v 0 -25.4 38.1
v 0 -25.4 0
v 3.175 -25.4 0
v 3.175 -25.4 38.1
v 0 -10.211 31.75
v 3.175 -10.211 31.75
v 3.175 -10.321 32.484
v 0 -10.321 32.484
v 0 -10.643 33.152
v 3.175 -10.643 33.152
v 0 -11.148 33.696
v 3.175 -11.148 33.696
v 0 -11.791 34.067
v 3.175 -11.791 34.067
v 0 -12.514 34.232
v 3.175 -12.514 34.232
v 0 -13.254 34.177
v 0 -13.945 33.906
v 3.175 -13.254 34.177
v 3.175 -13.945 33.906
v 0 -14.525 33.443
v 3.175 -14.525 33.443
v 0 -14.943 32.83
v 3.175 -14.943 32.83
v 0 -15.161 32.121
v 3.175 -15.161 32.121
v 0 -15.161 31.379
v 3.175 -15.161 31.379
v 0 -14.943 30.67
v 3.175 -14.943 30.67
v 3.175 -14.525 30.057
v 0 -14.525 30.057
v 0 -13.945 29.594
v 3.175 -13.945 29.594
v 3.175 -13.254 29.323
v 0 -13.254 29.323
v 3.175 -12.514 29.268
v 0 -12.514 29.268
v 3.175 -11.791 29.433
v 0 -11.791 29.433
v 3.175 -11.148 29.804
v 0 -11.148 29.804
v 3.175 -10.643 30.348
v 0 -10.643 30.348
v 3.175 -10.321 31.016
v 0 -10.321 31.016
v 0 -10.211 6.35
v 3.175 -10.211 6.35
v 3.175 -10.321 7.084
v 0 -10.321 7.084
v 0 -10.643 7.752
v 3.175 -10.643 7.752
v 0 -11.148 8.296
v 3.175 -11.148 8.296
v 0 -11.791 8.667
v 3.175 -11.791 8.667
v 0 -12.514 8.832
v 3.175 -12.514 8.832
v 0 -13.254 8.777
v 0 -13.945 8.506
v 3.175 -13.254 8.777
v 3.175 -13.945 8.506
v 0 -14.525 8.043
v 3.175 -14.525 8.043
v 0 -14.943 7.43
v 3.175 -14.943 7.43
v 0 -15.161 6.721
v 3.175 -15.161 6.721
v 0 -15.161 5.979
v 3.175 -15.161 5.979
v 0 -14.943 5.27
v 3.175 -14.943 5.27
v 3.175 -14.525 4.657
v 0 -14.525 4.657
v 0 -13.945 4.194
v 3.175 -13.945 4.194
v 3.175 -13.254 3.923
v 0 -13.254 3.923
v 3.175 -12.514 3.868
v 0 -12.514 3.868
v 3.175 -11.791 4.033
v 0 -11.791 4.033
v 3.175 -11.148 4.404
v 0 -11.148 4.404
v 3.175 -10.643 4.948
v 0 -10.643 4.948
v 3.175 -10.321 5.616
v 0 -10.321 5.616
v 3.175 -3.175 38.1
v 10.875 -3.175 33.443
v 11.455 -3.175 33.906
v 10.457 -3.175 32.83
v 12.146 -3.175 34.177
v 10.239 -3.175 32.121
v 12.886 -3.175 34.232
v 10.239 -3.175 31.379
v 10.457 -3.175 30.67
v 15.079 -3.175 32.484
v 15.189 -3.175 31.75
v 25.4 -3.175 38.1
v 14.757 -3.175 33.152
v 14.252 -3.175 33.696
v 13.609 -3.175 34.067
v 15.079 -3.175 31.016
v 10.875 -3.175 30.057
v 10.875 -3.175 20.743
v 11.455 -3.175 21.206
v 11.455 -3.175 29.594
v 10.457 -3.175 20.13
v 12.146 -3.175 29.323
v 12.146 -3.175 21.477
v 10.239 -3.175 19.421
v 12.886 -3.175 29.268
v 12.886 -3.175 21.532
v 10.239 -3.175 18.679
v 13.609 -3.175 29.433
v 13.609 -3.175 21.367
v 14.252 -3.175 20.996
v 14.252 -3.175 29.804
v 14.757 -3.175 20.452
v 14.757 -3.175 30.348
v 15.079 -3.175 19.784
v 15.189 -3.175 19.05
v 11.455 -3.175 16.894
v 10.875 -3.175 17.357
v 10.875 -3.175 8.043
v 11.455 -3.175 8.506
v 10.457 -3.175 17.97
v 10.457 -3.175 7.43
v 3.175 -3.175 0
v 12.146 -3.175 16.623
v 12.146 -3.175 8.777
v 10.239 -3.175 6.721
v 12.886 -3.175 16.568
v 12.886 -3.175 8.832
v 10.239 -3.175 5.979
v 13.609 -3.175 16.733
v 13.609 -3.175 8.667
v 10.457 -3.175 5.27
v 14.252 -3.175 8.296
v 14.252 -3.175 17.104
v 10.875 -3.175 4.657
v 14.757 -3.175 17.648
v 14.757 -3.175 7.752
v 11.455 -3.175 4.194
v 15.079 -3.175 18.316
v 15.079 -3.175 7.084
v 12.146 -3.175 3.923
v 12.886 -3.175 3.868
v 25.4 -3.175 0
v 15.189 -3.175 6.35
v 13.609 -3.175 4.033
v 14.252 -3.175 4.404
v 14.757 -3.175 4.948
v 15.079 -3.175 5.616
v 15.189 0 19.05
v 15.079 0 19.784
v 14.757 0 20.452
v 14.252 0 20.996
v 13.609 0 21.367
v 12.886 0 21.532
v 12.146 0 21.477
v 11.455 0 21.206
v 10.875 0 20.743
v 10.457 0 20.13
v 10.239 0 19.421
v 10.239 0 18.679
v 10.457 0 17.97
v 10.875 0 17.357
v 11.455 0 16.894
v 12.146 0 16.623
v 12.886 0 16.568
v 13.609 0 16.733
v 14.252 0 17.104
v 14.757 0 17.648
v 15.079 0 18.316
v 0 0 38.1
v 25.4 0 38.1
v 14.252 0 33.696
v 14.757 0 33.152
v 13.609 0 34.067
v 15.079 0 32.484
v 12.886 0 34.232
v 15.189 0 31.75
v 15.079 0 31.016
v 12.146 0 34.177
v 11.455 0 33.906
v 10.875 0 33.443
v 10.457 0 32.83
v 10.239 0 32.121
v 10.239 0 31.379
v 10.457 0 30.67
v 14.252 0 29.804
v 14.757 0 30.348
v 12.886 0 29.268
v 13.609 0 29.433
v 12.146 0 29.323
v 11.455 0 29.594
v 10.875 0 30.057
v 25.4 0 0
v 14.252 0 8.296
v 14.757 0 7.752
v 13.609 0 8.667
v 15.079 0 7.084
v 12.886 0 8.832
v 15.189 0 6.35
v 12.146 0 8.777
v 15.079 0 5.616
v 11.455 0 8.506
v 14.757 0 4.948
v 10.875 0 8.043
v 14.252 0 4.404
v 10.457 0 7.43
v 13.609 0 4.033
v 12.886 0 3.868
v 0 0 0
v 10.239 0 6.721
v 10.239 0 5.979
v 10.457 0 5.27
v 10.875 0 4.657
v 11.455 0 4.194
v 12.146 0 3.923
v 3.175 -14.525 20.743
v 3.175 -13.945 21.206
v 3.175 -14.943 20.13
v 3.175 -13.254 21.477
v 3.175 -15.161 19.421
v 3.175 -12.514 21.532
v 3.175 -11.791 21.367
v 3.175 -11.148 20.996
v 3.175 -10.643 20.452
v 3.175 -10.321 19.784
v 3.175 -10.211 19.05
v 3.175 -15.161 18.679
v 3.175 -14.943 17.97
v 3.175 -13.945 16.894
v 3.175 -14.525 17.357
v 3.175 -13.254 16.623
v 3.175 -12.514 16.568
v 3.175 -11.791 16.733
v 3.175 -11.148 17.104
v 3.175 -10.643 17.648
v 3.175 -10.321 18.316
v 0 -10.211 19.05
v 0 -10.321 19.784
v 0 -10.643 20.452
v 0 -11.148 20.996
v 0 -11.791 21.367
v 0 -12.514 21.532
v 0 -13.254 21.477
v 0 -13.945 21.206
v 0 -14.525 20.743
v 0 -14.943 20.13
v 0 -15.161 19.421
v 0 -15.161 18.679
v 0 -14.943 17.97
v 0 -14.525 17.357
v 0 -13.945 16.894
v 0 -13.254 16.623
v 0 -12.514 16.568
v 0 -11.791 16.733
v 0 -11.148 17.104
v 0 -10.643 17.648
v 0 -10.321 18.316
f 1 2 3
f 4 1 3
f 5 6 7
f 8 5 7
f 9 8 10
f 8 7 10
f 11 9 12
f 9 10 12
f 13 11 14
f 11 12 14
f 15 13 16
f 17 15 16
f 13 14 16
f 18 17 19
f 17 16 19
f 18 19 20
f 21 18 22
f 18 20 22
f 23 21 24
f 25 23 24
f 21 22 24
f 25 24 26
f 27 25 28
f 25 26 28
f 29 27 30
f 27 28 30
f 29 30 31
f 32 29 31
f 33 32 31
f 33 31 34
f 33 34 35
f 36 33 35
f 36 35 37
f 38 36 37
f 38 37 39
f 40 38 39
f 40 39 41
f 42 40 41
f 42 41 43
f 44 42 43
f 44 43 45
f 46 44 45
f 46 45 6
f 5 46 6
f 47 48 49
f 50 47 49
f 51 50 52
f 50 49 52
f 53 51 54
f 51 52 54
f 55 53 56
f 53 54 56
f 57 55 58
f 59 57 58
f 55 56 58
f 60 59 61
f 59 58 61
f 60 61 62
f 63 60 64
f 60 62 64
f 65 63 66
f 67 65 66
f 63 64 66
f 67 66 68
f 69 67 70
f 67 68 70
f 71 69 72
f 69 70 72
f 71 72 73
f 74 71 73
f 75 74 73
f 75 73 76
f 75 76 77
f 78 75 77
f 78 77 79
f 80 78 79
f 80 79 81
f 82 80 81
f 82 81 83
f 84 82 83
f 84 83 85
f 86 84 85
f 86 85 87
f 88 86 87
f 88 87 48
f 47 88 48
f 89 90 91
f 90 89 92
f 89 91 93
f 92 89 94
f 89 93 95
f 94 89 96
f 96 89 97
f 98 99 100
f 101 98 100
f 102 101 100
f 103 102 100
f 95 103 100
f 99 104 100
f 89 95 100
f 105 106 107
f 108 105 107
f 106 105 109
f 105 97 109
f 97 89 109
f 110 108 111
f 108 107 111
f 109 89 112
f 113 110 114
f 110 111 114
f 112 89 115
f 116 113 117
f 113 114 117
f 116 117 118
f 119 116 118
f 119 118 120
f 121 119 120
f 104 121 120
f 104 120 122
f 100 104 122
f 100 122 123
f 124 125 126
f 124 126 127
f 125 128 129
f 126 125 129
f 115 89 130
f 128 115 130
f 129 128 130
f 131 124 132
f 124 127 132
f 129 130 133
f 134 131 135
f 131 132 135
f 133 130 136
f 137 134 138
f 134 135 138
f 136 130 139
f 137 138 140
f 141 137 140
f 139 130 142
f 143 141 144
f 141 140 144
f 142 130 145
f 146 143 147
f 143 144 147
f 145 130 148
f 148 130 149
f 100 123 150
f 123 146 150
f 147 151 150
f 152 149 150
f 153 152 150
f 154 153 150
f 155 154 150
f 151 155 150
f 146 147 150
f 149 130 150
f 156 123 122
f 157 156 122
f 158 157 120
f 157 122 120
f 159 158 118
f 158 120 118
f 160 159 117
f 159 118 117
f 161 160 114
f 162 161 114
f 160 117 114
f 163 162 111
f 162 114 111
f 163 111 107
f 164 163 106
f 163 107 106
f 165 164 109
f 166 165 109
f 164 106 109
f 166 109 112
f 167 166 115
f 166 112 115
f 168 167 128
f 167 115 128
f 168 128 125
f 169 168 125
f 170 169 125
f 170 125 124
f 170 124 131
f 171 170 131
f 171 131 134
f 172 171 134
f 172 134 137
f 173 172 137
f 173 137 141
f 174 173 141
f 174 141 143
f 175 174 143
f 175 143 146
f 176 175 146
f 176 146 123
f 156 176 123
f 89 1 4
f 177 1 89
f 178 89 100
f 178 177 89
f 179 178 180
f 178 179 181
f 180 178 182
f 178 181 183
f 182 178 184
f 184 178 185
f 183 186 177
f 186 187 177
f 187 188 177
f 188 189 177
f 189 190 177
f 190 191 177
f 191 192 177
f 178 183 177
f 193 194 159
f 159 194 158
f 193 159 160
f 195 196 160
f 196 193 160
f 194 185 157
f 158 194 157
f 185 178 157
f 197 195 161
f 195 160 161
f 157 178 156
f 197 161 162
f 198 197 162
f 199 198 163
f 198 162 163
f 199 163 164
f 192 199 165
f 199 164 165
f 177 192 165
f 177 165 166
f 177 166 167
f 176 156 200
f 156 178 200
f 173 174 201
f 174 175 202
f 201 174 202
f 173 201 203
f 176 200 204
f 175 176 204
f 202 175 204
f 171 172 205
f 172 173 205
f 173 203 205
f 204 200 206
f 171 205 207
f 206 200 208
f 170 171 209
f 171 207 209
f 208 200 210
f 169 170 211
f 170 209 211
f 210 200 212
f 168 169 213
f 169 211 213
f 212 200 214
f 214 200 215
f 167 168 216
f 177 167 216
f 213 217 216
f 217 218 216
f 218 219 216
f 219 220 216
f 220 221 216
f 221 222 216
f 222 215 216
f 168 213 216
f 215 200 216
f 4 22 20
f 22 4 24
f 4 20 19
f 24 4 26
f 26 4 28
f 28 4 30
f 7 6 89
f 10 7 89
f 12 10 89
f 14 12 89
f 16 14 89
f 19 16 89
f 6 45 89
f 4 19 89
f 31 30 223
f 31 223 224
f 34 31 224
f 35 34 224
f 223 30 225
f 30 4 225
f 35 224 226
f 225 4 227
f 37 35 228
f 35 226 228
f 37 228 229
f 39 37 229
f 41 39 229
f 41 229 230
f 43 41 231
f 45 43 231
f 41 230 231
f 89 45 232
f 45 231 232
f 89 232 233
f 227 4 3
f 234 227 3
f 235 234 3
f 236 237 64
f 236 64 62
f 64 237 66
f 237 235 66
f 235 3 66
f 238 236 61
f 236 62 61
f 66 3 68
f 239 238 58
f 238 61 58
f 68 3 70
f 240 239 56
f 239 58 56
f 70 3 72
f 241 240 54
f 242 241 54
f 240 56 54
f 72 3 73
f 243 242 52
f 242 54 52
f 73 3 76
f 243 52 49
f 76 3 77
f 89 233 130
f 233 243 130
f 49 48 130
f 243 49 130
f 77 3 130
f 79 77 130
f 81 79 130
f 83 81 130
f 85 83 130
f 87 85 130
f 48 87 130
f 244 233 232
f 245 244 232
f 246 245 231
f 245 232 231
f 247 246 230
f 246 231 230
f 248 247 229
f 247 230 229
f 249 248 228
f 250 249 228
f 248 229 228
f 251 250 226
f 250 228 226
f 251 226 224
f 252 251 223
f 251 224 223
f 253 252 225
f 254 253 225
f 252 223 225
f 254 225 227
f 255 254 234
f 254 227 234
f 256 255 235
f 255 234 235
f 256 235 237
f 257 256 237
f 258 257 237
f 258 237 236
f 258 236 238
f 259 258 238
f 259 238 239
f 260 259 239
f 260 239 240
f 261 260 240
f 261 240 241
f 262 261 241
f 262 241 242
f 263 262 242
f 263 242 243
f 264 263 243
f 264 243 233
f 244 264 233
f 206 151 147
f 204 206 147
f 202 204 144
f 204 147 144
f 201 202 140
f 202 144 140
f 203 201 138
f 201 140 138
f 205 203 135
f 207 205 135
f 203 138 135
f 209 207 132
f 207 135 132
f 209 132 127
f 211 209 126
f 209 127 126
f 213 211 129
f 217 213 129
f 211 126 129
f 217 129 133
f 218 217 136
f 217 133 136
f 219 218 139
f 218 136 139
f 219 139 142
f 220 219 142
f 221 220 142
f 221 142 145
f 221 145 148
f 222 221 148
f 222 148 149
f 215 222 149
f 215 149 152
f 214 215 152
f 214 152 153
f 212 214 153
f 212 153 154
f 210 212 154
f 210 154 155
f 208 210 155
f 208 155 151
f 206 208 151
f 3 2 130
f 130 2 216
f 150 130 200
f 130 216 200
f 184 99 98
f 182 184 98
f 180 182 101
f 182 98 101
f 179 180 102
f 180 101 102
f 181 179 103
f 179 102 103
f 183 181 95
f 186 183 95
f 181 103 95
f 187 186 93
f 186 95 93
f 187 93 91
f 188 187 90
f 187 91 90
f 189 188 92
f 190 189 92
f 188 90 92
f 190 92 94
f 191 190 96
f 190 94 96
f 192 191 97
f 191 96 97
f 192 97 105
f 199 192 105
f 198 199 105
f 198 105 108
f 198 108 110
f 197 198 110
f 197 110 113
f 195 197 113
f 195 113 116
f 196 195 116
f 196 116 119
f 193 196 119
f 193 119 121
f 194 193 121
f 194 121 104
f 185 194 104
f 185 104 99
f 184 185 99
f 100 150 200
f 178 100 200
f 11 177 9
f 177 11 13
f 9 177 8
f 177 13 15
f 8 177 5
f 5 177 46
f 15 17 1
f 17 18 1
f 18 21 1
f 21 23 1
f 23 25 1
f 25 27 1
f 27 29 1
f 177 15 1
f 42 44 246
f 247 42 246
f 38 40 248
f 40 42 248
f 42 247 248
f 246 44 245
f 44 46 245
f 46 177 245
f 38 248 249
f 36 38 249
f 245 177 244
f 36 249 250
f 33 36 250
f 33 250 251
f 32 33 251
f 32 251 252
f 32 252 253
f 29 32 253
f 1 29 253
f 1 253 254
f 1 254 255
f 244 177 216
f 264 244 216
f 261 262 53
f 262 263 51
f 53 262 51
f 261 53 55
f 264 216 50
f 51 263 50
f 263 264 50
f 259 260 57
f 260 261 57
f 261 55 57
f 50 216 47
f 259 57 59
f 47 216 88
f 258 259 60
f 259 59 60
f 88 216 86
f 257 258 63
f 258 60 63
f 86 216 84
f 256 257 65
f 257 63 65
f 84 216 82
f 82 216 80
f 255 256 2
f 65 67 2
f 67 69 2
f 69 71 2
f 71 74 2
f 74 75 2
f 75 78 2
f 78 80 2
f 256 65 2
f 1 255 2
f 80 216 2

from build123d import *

# Parameters (mm, degrees)
BOSS_EXTRUDE1_DEPTH = 38.1
SKETCH5_R           = 2.4892
CUT_EXTRUDE1_DEPTH  = 51.899122045
SKETCH6_R           = 2.4892
CUT_EXTRUDE2_DEPTH  = 51.899122045


with BuildPart() as part:
    # Sketch2 → Boss-Extrude1 (new body)
    with BuildSketch(Plane.XY):
        Polygon((0, 0), (0, -25.4), (3.175, -25.4), (3.175, -3.175), (25.4, -3.175), (25.4, 0), align=None)
    extrude(amount=BOSS_EXTRUDE1_DEPTH)

    # Sketch5 → Cut-Extrude1 (cut, through all)
    with BuildSketch(Plane(origin=(3.175, 0, 0), x_dir=(0, 0, -1), z_dir=(1, 0, 0))):
        with Locations(Location((-6.35, -12.7, 0), (0, 0, 90))):
            Circle(SKETCH5_R)
        with Locations(Location((-19.05, -12.7, 0), (0, 0, 90))):
            Circle(SKETCH5_R)
        with Locations(Location((-31.75, -12.7, 0), (0, 0, 90))):
            Circle(SKETCH5_R)
        with Locations((-44.45, -12.7)):
            Circle(SKETCH5_R)
    extrude(amount=-CUT_EXTRUDE1_DEPTH, mode=Mode.SUBTRACT)

    # Sketch6 → Cut-Extrude2 (cut, through all)
    with BuildSketch(Plane.XZ.offset(3.175)):
        with Locations((12.7, 6.35)):
            Circle(SKETCH6_R)
        with Locations((12.7, 19.05)):
            Circle(SKETCH6_R)
        with Locations((12.7, 31.75)):
            Circle(SKETCH6_R)
        with Locations((12.7, 44.45)):
            Circle(SKETCH6_R)
    extrude(amount=-CUT_EXTRUDE2_DEPTH, mode=Mode.SUBTRACT)


solid = part.part
